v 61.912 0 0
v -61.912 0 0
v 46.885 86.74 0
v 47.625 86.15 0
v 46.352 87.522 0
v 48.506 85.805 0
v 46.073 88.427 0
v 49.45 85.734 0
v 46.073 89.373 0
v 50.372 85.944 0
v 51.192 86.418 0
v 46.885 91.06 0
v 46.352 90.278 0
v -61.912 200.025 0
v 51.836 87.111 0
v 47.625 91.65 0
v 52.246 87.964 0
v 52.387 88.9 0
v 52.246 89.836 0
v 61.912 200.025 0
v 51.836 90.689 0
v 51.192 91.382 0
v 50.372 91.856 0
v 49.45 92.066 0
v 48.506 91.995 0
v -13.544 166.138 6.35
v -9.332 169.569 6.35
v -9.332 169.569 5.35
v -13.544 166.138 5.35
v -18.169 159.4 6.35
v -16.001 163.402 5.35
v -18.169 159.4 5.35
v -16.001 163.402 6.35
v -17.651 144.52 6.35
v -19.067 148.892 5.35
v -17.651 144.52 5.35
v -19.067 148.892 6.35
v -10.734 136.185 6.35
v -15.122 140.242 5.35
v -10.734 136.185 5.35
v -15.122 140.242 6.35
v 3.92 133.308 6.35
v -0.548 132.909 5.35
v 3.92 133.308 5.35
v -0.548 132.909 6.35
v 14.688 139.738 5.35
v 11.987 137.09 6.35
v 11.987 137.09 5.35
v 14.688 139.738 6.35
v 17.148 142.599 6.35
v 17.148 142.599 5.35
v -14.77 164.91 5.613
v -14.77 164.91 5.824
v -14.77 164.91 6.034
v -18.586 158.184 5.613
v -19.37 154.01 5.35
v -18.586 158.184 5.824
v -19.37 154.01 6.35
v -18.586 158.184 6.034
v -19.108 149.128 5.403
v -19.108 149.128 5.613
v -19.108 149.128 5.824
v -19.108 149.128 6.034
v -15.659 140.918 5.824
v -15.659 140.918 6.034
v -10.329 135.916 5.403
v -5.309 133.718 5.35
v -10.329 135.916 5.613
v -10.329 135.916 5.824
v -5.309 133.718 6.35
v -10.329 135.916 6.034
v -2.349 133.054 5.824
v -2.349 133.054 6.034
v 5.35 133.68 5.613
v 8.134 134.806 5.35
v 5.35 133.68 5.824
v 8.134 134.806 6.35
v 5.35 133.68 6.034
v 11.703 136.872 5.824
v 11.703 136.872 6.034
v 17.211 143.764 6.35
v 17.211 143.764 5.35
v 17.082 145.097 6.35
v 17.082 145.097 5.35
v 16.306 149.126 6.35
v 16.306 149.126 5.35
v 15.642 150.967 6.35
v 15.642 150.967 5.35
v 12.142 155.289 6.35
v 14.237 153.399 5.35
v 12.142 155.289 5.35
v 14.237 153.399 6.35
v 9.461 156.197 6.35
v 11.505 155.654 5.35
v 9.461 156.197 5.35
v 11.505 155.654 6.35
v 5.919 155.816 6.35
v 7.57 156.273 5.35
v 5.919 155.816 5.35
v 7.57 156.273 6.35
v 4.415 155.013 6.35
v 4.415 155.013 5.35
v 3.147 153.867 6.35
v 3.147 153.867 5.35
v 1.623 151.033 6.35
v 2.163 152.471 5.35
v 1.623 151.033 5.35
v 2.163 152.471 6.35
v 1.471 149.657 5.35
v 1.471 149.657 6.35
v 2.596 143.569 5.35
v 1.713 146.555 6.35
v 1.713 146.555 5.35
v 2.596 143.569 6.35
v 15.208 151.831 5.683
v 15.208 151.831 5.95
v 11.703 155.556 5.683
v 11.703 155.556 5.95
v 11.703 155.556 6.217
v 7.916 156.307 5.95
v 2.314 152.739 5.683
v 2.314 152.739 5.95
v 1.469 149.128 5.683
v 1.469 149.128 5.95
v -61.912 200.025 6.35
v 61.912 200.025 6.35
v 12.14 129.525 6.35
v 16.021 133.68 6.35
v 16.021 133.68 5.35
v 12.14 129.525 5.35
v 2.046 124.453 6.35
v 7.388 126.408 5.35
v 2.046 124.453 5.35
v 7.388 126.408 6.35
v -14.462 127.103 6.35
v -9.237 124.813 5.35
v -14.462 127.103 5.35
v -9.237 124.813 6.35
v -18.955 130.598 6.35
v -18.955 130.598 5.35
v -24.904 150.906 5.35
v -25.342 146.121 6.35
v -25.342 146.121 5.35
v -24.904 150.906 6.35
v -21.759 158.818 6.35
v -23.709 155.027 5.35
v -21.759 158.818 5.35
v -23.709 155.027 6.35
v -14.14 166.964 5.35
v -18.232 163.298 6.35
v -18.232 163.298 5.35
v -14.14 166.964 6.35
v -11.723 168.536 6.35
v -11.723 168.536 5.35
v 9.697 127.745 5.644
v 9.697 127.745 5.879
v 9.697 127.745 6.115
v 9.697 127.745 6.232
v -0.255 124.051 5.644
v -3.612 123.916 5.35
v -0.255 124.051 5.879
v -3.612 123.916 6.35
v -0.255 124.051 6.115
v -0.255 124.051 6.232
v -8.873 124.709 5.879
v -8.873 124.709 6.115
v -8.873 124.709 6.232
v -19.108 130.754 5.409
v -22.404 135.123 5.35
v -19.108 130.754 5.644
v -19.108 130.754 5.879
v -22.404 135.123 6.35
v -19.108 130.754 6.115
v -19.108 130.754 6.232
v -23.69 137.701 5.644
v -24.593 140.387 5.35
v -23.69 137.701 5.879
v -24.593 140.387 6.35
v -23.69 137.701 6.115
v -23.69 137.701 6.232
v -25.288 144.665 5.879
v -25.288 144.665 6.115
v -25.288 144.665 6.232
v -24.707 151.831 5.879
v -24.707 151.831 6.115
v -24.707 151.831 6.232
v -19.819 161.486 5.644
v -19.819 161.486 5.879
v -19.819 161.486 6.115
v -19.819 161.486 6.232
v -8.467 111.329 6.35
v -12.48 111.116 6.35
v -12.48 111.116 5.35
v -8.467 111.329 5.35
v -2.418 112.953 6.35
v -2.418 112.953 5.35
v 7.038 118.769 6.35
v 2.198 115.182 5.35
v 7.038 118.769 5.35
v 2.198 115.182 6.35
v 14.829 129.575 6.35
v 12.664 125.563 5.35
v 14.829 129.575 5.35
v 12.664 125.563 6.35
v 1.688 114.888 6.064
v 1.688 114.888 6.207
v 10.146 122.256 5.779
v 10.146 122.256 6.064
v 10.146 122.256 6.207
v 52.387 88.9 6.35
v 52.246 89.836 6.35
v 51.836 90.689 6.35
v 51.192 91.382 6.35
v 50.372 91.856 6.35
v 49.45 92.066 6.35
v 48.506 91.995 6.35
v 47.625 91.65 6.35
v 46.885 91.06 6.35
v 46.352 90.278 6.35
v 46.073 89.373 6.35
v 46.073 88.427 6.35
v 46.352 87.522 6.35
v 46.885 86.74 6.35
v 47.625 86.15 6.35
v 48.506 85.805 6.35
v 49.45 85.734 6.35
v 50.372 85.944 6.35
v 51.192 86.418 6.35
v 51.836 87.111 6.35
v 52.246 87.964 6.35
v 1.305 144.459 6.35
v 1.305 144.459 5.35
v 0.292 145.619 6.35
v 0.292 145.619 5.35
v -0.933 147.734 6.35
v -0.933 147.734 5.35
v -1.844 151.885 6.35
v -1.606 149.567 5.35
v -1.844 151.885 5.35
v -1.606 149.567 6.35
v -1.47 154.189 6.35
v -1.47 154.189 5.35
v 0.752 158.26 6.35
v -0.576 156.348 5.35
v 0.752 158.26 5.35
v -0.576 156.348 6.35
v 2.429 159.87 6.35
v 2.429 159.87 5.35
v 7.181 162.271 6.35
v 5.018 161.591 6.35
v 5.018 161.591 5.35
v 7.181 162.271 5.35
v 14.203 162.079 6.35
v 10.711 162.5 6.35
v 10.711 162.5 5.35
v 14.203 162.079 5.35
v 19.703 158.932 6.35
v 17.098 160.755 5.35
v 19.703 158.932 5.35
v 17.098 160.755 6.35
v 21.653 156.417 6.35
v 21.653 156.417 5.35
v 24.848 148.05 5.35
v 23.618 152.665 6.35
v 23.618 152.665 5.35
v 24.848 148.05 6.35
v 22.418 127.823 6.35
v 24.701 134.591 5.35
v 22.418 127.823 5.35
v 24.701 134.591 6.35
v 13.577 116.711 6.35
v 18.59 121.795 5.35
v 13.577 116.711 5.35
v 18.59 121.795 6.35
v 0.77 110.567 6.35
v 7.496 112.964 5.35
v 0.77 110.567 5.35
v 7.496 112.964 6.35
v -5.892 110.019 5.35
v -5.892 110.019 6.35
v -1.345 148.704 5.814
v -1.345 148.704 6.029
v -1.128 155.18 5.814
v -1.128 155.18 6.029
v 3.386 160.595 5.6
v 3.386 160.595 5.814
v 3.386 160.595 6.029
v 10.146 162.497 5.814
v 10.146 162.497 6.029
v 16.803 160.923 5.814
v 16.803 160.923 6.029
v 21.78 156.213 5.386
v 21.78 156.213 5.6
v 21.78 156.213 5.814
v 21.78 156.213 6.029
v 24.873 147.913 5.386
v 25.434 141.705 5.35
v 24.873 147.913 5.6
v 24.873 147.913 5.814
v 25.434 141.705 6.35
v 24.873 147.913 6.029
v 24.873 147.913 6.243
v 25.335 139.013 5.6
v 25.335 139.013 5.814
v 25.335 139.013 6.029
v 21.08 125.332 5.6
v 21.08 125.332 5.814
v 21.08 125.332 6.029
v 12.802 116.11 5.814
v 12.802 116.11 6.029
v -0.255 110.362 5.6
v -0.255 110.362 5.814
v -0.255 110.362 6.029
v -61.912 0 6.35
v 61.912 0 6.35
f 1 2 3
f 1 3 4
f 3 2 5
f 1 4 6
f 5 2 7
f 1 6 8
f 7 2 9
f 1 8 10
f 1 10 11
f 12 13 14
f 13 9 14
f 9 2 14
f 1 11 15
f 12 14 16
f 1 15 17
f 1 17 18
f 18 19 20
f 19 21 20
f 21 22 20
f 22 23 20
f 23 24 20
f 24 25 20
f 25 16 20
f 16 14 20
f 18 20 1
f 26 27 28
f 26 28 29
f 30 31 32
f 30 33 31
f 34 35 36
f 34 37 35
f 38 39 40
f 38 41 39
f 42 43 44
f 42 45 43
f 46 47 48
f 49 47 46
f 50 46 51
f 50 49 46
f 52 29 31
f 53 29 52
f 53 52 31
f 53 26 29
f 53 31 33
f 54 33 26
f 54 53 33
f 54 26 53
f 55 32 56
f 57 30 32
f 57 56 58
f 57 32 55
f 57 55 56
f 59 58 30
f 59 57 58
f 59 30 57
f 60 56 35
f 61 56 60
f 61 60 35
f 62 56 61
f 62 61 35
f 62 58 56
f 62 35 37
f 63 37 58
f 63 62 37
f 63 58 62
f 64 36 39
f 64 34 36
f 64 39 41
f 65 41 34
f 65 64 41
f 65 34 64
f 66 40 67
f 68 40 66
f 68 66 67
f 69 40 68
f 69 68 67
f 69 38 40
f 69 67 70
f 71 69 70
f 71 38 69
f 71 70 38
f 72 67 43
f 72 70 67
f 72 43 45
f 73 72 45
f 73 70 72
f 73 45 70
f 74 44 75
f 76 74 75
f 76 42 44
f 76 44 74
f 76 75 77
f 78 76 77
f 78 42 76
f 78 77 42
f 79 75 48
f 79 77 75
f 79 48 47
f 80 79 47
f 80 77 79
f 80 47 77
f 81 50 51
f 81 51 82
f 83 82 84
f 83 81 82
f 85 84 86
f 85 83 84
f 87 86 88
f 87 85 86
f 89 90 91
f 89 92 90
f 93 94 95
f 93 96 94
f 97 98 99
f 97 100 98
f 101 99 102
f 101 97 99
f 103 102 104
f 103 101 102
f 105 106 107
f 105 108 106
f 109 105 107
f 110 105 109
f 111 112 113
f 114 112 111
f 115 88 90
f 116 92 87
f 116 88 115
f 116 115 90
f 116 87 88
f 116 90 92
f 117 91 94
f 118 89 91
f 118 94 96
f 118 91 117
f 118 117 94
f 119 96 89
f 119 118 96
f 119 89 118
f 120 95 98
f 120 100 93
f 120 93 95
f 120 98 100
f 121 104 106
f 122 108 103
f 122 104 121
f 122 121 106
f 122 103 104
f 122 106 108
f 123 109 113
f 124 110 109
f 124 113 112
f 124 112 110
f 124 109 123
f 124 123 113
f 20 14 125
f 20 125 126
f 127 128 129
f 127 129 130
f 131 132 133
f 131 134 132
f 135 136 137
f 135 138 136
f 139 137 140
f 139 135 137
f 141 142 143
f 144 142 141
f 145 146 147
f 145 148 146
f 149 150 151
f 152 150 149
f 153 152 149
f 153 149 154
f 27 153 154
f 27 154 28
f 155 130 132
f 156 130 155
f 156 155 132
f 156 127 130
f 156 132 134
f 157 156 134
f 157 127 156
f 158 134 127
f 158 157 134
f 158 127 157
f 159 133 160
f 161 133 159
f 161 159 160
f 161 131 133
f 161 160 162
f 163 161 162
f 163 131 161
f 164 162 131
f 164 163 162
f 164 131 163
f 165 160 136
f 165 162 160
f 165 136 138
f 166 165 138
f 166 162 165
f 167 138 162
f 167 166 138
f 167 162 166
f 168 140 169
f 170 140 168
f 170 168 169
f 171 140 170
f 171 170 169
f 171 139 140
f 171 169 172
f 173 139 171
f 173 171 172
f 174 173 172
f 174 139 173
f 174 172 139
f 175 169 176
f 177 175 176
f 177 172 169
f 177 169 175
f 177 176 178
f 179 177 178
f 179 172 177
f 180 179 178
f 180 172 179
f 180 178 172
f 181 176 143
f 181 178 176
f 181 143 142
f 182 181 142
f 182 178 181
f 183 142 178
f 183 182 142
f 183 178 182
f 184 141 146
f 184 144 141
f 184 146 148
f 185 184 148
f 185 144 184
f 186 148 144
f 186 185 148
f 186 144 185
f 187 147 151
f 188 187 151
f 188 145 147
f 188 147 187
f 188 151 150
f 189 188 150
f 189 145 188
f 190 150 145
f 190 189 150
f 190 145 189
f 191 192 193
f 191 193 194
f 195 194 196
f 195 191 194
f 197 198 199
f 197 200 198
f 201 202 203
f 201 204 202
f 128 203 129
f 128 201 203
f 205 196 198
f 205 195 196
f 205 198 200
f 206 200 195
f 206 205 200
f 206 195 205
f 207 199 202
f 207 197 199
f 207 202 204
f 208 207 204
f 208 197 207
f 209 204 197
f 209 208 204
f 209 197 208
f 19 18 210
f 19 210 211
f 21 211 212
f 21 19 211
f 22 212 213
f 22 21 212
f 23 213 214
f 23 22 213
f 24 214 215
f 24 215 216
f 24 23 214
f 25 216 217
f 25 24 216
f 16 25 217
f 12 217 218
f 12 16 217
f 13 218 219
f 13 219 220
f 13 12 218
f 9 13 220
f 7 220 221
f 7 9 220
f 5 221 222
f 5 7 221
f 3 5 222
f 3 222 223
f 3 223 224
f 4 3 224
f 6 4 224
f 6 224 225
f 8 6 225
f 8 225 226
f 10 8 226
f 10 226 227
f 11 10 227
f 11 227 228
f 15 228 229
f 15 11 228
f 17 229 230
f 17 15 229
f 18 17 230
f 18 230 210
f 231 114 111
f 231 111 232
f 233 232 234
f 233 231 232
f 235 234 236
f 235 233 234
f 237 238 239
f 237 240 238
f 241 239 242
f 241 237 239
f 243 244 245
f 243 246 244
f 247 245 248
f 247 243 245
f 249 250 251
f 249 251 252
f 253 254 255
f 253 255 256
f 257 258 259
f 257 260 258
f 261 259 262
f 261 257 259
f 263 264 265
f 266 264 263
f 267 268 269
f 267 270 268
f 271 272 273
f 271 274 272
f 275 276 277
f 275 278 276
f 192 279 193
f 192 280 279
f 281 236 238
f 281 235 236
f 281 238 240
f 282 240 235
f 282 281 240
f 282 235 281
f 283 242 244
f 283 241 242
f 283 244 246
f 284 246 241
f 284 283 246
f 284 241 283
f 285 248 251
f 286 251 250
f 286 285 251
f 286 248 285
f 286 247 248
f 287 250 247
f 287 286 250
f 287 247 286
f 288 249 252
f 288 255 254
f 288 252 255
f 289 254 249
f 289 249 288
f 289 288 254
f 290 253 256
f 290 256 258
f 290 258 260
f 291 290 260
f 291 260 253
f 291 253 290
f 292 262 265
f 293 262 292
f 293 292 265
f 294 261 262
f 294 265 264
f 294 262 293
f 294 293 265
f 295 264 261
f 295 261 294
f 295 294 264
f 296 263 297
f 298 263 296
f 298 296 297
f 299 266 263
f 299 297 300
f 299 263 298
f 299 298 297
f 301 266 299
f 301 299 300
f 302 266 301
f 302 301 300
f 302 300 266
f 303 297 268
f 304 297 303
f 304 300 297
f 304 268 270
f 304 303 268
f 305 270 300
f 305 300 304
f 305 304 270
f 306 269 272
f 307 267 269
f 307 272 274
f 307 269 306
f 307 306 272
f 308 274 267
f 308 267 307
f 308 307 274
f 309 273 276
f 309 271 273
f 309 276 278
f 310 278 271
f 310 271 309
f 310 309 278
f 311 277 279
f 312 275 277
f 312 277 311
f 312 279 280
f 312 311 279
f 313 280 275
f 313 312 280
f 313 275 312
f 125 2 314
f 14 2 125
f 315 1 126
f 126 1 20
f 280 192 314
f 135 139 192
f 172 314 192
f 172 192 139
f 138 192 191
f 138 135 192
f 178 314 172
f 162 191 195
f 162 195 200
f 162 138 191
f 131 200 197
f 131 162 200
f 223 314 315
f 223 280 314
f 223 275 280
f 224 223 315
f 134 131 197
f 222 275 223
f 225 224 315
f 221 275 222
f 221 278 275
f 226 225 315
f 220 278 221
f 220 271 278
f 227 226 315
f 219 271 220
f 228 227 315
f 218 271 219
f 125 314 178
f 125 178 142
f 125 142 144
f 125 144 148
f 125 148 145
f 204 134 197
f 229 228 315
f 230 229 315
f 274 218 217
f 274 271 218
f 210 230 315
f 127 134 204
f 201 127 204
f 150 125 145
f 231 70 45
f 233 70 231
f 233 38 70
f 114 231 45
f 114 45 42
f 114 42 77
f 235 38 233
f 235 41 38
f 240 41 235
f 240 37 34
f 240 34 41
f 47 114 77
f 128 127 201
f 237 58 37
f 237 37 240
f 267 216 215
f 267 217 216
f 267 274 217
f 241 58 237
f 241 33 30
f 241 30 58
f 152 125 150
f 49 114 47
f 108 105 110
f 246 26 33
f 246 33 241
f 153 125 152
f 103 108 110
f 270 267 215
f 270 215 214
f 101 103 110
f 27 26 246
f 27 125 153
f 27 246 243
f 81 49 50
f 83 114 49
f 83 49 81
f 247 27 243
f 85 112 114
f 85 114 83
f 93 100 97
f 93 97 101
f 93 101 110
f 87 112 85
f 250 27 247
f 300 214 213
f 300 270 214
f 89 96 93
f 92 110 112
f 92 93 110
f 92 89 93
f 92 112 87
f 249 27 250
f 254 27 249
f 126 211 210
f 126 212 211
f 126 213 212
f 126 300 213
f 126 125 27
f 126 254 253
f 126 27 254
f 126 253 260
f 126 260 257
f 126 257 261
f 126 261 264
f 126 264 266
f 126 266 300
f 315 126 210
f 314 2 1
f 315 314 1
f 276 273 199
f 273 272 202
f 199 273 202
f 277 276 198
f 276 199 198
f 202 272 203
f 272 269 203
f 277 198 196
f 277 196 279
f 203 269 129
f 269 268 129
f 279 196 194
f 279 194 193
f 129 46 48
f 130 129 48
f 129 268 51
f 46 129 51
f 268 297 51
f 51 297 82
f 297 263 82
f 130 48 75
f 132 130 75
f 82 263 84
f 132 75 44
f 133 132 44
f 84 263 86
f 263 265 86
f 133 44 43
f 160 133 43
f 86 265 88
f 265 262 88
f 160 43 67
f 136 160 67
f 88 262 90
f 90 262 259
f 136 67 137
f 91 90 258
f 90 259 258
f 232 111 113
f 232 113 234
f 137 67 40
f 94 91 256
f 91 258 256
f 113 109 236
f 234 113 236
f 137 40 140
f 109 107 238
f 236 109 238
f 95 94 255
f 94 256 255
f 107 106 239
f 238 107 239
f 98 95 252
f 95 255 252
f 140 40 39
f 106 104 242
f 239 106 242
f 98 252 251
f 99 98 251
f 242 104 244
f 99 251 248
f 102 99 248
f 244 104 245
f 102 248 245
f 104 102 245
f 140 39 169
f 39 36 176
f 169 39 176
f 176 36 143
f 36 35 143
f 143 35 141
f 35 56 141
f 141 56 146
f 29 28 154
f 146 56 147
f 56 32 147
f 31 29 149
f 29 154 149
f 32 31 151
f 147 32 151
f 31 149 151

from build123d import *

# Parameters (mm, degrees)
SKETCH1_W           = 123.825
SKETCH1_H           = 200.025
BOSS_EXTRUDE1_DEPTH = 6.35
CUT_EXTRUDE1_DEPTH  = 1
SKETCH3_R           = 3.175
CUT_EXTRUDE5_DEPTH  = 6.35


with BuildPart() as part:
    # Sketch1 → Boss-Extrude1 (new body)
    with BuildSketch(Plane.XY):
        with Locations((0, 100.0125)):
            Rectangle(SKETCH1_W, SKETCH1_H)
    extrude(amount=BOSS_EXTRUDE1_DEPTH)

    # Sketch2 → Cut-Extrude1 (cut)
    with BuildSketch(Plane.XY.offset(6.35)):
        with BuildLine():
            add(Edge.make_bspline(
                [(-9.3315137, 169.569243245), (-11.197682458, 168.0976913), (-14.473708818, 165.721233019), (-17.3515287, 161.55448265), (-18.744772102, 157.97825035), (-19.57008031, 154.001795446), (-19.358235831, 149.934925708), (-18.469822241, 146.12187465), (-17.124182712, 143.444668775), (-15.644034584, 140.599586864), (-13.588642306, 138.679050764), (-11.836257338, 136.982177805), (-10.077256706, 135.678856281), (-7.853613512, 134.599615465), (-5.185304822, 133.61558172), (-2.047786445, 132.897639564), (1.519421734, 132.841261276), (5.39237554, 133.515486042), (8.762284385, 135.063456784), (13.159045788, 137.534995882), (15.41933096, 140.673664776), (17.148115982, 142.599332984)],
                knots=[0, 0, 0, 0, 0.099961909, 0.167105029, 0.208449478, 0.26000516, 0.335840189, 0.376754282, 0.422870274, 0.460837159, 0.509980806, 0.539098001, 0.563057055, 0.601178667, 0.642018306, 0.681938728, 0.735202325, 0.790245849, 0.844804461, 0.889640513, 1, 1, 1, 1], degree=3))
            add(Edge.make_bspline(
                [(17.148115982, 142.599332984), (17.367564898, 144.13870869), (16.733511702, 146.581109303), (16.27851799, 149.765590012), (15.257046991, 151.728449354), (14.513019179, 153.196973861), (13.240823028, 154.375565069), (11.745568369, 155.781281157), (9.683821258, 156.19357481), (7.817396792, 156.396871018), (6.203806641, 155.97816213), (4.652965895, 155.265249531), (3.330558451, 154.147368605), (2.264943334, 152.806256443), (1.516548282, 151.083064738), (1.371346174, 147.894578102), (1.84694368, 145.341424214), (2.595738039, 143.569491513)],
                knots=[0, 0, 0, 0, 0.129227486, 0.217526215, 0.272879708, 0.318699717, 0.357375737, 0.421225341, 0.491051763, 0.532380112, 0.58197413, 0.631697637, 0.678188113, 0.729298629, 0.777918757, 0.836782647, 1, 1, 1, 1], degree=3))
            add(Edge.make_bspline(
                [(2.595738039, 143.569491513), (1.091260425, 144.310158379), (-0.219261636, 146.215388888), (-1.583212927, 149.064413701), (-2.047008332, 151.87724563), (-1.347571294, 155.191523623), (0.573453598, 158.349369243), (2.984260186, 160.391278639), (6.053225923, 162.32432944), (9.778943871, 162.556297831), (14.026176553, 162.441587138), (17.093369221, 160.81063786), (19.954602244, 158.976975505), (21.782777067, 156.302763768), (23.650890625, 153.012737551), (25.241855425, 147.240745591), (25.735418593, 140.388419647), (24.627732078, 133.63565983), (23.078571098, 129.062371922), (21.165081325, 125.256739903), (18.863141262, 122.066101255), (16.769401407, 119.576261489), (14.765247422, 117.697271946), (12.495470846, 115.768794509), (9.628425201, 114.075558071), (6.510664621, 112.417594108), (3.292717559, 111.195822905), (-0.597926715, 110.157178984), (-5.997823526, 109.821254189), (-10.108137267, 110.358818405), (-12.480099704, 111.116416453)],
                knots=[0, 0, 0, 0, 0.042580268, 0.060224686, 0.08386458, 0.116965183, 0.148096973, 0.180452989, 0.200374999, 0.24344269, 0.276533285, 0.312238472, 0.333844074, 0.366401949, 0.396661336, 0.434486559, 0.524427596, 0.57712071, 0.615572447, 0.652537223, 0.689999449, 0.720028669, 0.738935019, 0.763057377, 0.799114426, 0.827221945, 0.85696418, 0.890507339, 0.9340038, 1, 1, 1, 1], degree=3))
            add(Edge.make_bspline(
                [(-12.480099704, 111.116416453), (-10.129509341, 110.851795977), (-6.766504791, 111.676958112), (-1.98778411, 112.975517751), (2.16491123, 115.032216309), (6.576646899, 117.974608303), (9.964617235, 122.001460334), (13.774755311, 126.773576412), (15.547642905, 130.861311443), (16.02148027, 133.6801336)],
                knots=[0, 0, 0, 0, 0.176744277, 0.265013981, 0.379273682, 0.53095193, 0.667955404, 0.780622384, 1, 1, 1, 1], degree=3))
            add(Edge.make_bspline(
                [(16.02148027, 133.6801336), (15.284751167, 132.546381486), (13.729522727, 131.07018515), (11.664732098, 129.010614657), (9.597669158, 127.664469948), (7.112988668, 126.179760231), (3.800643978, 124.813352957), (0.241003836, 124.010205105), (-4.0915461, 123.798546407), (-9.411378564, 124.519214898), (-14.89887892, 127.064106493), (-19.214250688, 130.610000296), (-21.908165408, 134.091041706), (-25.432890172, 140.742158426), (-25.903440928, 149.142146476), (-23.050507432, 157.045363775), (-19.622590138, 162.033808821), (-15.135925354, 166.48695288), (-11.34416307, 168.928938218), (-9.3315137, 169.569243245)],
                knots=[0, 0, 0, 0, 0.046226378, 0.074002645, 0.100379959, 0.131070976, 0.173920494, 0.22349156, 0.256215817, 0.323367781, 0.406730252, 0.461306621, 0.514924876, 0.557488619, 0.720548112, 0.782951714, 0.845978771, 0.927692708, 1, 1, 1, 1], degree=3))
        make_face()
    extrude(amount=-CUT_EXTRUDE1_DEPTH, mode=Mode.SUBTRACT)

    # Sketch3 → Cut-Extrude5 (cut)
    with BuildSketch(Plane.XY):
        with Locations((49.2125, 88.9)):
            Circle(SKETCH3_R)
    extrude(amount=CUT_EXTRUDE5_DEPTH, mode=Mode.SUBTRACT)


solid = part.part
